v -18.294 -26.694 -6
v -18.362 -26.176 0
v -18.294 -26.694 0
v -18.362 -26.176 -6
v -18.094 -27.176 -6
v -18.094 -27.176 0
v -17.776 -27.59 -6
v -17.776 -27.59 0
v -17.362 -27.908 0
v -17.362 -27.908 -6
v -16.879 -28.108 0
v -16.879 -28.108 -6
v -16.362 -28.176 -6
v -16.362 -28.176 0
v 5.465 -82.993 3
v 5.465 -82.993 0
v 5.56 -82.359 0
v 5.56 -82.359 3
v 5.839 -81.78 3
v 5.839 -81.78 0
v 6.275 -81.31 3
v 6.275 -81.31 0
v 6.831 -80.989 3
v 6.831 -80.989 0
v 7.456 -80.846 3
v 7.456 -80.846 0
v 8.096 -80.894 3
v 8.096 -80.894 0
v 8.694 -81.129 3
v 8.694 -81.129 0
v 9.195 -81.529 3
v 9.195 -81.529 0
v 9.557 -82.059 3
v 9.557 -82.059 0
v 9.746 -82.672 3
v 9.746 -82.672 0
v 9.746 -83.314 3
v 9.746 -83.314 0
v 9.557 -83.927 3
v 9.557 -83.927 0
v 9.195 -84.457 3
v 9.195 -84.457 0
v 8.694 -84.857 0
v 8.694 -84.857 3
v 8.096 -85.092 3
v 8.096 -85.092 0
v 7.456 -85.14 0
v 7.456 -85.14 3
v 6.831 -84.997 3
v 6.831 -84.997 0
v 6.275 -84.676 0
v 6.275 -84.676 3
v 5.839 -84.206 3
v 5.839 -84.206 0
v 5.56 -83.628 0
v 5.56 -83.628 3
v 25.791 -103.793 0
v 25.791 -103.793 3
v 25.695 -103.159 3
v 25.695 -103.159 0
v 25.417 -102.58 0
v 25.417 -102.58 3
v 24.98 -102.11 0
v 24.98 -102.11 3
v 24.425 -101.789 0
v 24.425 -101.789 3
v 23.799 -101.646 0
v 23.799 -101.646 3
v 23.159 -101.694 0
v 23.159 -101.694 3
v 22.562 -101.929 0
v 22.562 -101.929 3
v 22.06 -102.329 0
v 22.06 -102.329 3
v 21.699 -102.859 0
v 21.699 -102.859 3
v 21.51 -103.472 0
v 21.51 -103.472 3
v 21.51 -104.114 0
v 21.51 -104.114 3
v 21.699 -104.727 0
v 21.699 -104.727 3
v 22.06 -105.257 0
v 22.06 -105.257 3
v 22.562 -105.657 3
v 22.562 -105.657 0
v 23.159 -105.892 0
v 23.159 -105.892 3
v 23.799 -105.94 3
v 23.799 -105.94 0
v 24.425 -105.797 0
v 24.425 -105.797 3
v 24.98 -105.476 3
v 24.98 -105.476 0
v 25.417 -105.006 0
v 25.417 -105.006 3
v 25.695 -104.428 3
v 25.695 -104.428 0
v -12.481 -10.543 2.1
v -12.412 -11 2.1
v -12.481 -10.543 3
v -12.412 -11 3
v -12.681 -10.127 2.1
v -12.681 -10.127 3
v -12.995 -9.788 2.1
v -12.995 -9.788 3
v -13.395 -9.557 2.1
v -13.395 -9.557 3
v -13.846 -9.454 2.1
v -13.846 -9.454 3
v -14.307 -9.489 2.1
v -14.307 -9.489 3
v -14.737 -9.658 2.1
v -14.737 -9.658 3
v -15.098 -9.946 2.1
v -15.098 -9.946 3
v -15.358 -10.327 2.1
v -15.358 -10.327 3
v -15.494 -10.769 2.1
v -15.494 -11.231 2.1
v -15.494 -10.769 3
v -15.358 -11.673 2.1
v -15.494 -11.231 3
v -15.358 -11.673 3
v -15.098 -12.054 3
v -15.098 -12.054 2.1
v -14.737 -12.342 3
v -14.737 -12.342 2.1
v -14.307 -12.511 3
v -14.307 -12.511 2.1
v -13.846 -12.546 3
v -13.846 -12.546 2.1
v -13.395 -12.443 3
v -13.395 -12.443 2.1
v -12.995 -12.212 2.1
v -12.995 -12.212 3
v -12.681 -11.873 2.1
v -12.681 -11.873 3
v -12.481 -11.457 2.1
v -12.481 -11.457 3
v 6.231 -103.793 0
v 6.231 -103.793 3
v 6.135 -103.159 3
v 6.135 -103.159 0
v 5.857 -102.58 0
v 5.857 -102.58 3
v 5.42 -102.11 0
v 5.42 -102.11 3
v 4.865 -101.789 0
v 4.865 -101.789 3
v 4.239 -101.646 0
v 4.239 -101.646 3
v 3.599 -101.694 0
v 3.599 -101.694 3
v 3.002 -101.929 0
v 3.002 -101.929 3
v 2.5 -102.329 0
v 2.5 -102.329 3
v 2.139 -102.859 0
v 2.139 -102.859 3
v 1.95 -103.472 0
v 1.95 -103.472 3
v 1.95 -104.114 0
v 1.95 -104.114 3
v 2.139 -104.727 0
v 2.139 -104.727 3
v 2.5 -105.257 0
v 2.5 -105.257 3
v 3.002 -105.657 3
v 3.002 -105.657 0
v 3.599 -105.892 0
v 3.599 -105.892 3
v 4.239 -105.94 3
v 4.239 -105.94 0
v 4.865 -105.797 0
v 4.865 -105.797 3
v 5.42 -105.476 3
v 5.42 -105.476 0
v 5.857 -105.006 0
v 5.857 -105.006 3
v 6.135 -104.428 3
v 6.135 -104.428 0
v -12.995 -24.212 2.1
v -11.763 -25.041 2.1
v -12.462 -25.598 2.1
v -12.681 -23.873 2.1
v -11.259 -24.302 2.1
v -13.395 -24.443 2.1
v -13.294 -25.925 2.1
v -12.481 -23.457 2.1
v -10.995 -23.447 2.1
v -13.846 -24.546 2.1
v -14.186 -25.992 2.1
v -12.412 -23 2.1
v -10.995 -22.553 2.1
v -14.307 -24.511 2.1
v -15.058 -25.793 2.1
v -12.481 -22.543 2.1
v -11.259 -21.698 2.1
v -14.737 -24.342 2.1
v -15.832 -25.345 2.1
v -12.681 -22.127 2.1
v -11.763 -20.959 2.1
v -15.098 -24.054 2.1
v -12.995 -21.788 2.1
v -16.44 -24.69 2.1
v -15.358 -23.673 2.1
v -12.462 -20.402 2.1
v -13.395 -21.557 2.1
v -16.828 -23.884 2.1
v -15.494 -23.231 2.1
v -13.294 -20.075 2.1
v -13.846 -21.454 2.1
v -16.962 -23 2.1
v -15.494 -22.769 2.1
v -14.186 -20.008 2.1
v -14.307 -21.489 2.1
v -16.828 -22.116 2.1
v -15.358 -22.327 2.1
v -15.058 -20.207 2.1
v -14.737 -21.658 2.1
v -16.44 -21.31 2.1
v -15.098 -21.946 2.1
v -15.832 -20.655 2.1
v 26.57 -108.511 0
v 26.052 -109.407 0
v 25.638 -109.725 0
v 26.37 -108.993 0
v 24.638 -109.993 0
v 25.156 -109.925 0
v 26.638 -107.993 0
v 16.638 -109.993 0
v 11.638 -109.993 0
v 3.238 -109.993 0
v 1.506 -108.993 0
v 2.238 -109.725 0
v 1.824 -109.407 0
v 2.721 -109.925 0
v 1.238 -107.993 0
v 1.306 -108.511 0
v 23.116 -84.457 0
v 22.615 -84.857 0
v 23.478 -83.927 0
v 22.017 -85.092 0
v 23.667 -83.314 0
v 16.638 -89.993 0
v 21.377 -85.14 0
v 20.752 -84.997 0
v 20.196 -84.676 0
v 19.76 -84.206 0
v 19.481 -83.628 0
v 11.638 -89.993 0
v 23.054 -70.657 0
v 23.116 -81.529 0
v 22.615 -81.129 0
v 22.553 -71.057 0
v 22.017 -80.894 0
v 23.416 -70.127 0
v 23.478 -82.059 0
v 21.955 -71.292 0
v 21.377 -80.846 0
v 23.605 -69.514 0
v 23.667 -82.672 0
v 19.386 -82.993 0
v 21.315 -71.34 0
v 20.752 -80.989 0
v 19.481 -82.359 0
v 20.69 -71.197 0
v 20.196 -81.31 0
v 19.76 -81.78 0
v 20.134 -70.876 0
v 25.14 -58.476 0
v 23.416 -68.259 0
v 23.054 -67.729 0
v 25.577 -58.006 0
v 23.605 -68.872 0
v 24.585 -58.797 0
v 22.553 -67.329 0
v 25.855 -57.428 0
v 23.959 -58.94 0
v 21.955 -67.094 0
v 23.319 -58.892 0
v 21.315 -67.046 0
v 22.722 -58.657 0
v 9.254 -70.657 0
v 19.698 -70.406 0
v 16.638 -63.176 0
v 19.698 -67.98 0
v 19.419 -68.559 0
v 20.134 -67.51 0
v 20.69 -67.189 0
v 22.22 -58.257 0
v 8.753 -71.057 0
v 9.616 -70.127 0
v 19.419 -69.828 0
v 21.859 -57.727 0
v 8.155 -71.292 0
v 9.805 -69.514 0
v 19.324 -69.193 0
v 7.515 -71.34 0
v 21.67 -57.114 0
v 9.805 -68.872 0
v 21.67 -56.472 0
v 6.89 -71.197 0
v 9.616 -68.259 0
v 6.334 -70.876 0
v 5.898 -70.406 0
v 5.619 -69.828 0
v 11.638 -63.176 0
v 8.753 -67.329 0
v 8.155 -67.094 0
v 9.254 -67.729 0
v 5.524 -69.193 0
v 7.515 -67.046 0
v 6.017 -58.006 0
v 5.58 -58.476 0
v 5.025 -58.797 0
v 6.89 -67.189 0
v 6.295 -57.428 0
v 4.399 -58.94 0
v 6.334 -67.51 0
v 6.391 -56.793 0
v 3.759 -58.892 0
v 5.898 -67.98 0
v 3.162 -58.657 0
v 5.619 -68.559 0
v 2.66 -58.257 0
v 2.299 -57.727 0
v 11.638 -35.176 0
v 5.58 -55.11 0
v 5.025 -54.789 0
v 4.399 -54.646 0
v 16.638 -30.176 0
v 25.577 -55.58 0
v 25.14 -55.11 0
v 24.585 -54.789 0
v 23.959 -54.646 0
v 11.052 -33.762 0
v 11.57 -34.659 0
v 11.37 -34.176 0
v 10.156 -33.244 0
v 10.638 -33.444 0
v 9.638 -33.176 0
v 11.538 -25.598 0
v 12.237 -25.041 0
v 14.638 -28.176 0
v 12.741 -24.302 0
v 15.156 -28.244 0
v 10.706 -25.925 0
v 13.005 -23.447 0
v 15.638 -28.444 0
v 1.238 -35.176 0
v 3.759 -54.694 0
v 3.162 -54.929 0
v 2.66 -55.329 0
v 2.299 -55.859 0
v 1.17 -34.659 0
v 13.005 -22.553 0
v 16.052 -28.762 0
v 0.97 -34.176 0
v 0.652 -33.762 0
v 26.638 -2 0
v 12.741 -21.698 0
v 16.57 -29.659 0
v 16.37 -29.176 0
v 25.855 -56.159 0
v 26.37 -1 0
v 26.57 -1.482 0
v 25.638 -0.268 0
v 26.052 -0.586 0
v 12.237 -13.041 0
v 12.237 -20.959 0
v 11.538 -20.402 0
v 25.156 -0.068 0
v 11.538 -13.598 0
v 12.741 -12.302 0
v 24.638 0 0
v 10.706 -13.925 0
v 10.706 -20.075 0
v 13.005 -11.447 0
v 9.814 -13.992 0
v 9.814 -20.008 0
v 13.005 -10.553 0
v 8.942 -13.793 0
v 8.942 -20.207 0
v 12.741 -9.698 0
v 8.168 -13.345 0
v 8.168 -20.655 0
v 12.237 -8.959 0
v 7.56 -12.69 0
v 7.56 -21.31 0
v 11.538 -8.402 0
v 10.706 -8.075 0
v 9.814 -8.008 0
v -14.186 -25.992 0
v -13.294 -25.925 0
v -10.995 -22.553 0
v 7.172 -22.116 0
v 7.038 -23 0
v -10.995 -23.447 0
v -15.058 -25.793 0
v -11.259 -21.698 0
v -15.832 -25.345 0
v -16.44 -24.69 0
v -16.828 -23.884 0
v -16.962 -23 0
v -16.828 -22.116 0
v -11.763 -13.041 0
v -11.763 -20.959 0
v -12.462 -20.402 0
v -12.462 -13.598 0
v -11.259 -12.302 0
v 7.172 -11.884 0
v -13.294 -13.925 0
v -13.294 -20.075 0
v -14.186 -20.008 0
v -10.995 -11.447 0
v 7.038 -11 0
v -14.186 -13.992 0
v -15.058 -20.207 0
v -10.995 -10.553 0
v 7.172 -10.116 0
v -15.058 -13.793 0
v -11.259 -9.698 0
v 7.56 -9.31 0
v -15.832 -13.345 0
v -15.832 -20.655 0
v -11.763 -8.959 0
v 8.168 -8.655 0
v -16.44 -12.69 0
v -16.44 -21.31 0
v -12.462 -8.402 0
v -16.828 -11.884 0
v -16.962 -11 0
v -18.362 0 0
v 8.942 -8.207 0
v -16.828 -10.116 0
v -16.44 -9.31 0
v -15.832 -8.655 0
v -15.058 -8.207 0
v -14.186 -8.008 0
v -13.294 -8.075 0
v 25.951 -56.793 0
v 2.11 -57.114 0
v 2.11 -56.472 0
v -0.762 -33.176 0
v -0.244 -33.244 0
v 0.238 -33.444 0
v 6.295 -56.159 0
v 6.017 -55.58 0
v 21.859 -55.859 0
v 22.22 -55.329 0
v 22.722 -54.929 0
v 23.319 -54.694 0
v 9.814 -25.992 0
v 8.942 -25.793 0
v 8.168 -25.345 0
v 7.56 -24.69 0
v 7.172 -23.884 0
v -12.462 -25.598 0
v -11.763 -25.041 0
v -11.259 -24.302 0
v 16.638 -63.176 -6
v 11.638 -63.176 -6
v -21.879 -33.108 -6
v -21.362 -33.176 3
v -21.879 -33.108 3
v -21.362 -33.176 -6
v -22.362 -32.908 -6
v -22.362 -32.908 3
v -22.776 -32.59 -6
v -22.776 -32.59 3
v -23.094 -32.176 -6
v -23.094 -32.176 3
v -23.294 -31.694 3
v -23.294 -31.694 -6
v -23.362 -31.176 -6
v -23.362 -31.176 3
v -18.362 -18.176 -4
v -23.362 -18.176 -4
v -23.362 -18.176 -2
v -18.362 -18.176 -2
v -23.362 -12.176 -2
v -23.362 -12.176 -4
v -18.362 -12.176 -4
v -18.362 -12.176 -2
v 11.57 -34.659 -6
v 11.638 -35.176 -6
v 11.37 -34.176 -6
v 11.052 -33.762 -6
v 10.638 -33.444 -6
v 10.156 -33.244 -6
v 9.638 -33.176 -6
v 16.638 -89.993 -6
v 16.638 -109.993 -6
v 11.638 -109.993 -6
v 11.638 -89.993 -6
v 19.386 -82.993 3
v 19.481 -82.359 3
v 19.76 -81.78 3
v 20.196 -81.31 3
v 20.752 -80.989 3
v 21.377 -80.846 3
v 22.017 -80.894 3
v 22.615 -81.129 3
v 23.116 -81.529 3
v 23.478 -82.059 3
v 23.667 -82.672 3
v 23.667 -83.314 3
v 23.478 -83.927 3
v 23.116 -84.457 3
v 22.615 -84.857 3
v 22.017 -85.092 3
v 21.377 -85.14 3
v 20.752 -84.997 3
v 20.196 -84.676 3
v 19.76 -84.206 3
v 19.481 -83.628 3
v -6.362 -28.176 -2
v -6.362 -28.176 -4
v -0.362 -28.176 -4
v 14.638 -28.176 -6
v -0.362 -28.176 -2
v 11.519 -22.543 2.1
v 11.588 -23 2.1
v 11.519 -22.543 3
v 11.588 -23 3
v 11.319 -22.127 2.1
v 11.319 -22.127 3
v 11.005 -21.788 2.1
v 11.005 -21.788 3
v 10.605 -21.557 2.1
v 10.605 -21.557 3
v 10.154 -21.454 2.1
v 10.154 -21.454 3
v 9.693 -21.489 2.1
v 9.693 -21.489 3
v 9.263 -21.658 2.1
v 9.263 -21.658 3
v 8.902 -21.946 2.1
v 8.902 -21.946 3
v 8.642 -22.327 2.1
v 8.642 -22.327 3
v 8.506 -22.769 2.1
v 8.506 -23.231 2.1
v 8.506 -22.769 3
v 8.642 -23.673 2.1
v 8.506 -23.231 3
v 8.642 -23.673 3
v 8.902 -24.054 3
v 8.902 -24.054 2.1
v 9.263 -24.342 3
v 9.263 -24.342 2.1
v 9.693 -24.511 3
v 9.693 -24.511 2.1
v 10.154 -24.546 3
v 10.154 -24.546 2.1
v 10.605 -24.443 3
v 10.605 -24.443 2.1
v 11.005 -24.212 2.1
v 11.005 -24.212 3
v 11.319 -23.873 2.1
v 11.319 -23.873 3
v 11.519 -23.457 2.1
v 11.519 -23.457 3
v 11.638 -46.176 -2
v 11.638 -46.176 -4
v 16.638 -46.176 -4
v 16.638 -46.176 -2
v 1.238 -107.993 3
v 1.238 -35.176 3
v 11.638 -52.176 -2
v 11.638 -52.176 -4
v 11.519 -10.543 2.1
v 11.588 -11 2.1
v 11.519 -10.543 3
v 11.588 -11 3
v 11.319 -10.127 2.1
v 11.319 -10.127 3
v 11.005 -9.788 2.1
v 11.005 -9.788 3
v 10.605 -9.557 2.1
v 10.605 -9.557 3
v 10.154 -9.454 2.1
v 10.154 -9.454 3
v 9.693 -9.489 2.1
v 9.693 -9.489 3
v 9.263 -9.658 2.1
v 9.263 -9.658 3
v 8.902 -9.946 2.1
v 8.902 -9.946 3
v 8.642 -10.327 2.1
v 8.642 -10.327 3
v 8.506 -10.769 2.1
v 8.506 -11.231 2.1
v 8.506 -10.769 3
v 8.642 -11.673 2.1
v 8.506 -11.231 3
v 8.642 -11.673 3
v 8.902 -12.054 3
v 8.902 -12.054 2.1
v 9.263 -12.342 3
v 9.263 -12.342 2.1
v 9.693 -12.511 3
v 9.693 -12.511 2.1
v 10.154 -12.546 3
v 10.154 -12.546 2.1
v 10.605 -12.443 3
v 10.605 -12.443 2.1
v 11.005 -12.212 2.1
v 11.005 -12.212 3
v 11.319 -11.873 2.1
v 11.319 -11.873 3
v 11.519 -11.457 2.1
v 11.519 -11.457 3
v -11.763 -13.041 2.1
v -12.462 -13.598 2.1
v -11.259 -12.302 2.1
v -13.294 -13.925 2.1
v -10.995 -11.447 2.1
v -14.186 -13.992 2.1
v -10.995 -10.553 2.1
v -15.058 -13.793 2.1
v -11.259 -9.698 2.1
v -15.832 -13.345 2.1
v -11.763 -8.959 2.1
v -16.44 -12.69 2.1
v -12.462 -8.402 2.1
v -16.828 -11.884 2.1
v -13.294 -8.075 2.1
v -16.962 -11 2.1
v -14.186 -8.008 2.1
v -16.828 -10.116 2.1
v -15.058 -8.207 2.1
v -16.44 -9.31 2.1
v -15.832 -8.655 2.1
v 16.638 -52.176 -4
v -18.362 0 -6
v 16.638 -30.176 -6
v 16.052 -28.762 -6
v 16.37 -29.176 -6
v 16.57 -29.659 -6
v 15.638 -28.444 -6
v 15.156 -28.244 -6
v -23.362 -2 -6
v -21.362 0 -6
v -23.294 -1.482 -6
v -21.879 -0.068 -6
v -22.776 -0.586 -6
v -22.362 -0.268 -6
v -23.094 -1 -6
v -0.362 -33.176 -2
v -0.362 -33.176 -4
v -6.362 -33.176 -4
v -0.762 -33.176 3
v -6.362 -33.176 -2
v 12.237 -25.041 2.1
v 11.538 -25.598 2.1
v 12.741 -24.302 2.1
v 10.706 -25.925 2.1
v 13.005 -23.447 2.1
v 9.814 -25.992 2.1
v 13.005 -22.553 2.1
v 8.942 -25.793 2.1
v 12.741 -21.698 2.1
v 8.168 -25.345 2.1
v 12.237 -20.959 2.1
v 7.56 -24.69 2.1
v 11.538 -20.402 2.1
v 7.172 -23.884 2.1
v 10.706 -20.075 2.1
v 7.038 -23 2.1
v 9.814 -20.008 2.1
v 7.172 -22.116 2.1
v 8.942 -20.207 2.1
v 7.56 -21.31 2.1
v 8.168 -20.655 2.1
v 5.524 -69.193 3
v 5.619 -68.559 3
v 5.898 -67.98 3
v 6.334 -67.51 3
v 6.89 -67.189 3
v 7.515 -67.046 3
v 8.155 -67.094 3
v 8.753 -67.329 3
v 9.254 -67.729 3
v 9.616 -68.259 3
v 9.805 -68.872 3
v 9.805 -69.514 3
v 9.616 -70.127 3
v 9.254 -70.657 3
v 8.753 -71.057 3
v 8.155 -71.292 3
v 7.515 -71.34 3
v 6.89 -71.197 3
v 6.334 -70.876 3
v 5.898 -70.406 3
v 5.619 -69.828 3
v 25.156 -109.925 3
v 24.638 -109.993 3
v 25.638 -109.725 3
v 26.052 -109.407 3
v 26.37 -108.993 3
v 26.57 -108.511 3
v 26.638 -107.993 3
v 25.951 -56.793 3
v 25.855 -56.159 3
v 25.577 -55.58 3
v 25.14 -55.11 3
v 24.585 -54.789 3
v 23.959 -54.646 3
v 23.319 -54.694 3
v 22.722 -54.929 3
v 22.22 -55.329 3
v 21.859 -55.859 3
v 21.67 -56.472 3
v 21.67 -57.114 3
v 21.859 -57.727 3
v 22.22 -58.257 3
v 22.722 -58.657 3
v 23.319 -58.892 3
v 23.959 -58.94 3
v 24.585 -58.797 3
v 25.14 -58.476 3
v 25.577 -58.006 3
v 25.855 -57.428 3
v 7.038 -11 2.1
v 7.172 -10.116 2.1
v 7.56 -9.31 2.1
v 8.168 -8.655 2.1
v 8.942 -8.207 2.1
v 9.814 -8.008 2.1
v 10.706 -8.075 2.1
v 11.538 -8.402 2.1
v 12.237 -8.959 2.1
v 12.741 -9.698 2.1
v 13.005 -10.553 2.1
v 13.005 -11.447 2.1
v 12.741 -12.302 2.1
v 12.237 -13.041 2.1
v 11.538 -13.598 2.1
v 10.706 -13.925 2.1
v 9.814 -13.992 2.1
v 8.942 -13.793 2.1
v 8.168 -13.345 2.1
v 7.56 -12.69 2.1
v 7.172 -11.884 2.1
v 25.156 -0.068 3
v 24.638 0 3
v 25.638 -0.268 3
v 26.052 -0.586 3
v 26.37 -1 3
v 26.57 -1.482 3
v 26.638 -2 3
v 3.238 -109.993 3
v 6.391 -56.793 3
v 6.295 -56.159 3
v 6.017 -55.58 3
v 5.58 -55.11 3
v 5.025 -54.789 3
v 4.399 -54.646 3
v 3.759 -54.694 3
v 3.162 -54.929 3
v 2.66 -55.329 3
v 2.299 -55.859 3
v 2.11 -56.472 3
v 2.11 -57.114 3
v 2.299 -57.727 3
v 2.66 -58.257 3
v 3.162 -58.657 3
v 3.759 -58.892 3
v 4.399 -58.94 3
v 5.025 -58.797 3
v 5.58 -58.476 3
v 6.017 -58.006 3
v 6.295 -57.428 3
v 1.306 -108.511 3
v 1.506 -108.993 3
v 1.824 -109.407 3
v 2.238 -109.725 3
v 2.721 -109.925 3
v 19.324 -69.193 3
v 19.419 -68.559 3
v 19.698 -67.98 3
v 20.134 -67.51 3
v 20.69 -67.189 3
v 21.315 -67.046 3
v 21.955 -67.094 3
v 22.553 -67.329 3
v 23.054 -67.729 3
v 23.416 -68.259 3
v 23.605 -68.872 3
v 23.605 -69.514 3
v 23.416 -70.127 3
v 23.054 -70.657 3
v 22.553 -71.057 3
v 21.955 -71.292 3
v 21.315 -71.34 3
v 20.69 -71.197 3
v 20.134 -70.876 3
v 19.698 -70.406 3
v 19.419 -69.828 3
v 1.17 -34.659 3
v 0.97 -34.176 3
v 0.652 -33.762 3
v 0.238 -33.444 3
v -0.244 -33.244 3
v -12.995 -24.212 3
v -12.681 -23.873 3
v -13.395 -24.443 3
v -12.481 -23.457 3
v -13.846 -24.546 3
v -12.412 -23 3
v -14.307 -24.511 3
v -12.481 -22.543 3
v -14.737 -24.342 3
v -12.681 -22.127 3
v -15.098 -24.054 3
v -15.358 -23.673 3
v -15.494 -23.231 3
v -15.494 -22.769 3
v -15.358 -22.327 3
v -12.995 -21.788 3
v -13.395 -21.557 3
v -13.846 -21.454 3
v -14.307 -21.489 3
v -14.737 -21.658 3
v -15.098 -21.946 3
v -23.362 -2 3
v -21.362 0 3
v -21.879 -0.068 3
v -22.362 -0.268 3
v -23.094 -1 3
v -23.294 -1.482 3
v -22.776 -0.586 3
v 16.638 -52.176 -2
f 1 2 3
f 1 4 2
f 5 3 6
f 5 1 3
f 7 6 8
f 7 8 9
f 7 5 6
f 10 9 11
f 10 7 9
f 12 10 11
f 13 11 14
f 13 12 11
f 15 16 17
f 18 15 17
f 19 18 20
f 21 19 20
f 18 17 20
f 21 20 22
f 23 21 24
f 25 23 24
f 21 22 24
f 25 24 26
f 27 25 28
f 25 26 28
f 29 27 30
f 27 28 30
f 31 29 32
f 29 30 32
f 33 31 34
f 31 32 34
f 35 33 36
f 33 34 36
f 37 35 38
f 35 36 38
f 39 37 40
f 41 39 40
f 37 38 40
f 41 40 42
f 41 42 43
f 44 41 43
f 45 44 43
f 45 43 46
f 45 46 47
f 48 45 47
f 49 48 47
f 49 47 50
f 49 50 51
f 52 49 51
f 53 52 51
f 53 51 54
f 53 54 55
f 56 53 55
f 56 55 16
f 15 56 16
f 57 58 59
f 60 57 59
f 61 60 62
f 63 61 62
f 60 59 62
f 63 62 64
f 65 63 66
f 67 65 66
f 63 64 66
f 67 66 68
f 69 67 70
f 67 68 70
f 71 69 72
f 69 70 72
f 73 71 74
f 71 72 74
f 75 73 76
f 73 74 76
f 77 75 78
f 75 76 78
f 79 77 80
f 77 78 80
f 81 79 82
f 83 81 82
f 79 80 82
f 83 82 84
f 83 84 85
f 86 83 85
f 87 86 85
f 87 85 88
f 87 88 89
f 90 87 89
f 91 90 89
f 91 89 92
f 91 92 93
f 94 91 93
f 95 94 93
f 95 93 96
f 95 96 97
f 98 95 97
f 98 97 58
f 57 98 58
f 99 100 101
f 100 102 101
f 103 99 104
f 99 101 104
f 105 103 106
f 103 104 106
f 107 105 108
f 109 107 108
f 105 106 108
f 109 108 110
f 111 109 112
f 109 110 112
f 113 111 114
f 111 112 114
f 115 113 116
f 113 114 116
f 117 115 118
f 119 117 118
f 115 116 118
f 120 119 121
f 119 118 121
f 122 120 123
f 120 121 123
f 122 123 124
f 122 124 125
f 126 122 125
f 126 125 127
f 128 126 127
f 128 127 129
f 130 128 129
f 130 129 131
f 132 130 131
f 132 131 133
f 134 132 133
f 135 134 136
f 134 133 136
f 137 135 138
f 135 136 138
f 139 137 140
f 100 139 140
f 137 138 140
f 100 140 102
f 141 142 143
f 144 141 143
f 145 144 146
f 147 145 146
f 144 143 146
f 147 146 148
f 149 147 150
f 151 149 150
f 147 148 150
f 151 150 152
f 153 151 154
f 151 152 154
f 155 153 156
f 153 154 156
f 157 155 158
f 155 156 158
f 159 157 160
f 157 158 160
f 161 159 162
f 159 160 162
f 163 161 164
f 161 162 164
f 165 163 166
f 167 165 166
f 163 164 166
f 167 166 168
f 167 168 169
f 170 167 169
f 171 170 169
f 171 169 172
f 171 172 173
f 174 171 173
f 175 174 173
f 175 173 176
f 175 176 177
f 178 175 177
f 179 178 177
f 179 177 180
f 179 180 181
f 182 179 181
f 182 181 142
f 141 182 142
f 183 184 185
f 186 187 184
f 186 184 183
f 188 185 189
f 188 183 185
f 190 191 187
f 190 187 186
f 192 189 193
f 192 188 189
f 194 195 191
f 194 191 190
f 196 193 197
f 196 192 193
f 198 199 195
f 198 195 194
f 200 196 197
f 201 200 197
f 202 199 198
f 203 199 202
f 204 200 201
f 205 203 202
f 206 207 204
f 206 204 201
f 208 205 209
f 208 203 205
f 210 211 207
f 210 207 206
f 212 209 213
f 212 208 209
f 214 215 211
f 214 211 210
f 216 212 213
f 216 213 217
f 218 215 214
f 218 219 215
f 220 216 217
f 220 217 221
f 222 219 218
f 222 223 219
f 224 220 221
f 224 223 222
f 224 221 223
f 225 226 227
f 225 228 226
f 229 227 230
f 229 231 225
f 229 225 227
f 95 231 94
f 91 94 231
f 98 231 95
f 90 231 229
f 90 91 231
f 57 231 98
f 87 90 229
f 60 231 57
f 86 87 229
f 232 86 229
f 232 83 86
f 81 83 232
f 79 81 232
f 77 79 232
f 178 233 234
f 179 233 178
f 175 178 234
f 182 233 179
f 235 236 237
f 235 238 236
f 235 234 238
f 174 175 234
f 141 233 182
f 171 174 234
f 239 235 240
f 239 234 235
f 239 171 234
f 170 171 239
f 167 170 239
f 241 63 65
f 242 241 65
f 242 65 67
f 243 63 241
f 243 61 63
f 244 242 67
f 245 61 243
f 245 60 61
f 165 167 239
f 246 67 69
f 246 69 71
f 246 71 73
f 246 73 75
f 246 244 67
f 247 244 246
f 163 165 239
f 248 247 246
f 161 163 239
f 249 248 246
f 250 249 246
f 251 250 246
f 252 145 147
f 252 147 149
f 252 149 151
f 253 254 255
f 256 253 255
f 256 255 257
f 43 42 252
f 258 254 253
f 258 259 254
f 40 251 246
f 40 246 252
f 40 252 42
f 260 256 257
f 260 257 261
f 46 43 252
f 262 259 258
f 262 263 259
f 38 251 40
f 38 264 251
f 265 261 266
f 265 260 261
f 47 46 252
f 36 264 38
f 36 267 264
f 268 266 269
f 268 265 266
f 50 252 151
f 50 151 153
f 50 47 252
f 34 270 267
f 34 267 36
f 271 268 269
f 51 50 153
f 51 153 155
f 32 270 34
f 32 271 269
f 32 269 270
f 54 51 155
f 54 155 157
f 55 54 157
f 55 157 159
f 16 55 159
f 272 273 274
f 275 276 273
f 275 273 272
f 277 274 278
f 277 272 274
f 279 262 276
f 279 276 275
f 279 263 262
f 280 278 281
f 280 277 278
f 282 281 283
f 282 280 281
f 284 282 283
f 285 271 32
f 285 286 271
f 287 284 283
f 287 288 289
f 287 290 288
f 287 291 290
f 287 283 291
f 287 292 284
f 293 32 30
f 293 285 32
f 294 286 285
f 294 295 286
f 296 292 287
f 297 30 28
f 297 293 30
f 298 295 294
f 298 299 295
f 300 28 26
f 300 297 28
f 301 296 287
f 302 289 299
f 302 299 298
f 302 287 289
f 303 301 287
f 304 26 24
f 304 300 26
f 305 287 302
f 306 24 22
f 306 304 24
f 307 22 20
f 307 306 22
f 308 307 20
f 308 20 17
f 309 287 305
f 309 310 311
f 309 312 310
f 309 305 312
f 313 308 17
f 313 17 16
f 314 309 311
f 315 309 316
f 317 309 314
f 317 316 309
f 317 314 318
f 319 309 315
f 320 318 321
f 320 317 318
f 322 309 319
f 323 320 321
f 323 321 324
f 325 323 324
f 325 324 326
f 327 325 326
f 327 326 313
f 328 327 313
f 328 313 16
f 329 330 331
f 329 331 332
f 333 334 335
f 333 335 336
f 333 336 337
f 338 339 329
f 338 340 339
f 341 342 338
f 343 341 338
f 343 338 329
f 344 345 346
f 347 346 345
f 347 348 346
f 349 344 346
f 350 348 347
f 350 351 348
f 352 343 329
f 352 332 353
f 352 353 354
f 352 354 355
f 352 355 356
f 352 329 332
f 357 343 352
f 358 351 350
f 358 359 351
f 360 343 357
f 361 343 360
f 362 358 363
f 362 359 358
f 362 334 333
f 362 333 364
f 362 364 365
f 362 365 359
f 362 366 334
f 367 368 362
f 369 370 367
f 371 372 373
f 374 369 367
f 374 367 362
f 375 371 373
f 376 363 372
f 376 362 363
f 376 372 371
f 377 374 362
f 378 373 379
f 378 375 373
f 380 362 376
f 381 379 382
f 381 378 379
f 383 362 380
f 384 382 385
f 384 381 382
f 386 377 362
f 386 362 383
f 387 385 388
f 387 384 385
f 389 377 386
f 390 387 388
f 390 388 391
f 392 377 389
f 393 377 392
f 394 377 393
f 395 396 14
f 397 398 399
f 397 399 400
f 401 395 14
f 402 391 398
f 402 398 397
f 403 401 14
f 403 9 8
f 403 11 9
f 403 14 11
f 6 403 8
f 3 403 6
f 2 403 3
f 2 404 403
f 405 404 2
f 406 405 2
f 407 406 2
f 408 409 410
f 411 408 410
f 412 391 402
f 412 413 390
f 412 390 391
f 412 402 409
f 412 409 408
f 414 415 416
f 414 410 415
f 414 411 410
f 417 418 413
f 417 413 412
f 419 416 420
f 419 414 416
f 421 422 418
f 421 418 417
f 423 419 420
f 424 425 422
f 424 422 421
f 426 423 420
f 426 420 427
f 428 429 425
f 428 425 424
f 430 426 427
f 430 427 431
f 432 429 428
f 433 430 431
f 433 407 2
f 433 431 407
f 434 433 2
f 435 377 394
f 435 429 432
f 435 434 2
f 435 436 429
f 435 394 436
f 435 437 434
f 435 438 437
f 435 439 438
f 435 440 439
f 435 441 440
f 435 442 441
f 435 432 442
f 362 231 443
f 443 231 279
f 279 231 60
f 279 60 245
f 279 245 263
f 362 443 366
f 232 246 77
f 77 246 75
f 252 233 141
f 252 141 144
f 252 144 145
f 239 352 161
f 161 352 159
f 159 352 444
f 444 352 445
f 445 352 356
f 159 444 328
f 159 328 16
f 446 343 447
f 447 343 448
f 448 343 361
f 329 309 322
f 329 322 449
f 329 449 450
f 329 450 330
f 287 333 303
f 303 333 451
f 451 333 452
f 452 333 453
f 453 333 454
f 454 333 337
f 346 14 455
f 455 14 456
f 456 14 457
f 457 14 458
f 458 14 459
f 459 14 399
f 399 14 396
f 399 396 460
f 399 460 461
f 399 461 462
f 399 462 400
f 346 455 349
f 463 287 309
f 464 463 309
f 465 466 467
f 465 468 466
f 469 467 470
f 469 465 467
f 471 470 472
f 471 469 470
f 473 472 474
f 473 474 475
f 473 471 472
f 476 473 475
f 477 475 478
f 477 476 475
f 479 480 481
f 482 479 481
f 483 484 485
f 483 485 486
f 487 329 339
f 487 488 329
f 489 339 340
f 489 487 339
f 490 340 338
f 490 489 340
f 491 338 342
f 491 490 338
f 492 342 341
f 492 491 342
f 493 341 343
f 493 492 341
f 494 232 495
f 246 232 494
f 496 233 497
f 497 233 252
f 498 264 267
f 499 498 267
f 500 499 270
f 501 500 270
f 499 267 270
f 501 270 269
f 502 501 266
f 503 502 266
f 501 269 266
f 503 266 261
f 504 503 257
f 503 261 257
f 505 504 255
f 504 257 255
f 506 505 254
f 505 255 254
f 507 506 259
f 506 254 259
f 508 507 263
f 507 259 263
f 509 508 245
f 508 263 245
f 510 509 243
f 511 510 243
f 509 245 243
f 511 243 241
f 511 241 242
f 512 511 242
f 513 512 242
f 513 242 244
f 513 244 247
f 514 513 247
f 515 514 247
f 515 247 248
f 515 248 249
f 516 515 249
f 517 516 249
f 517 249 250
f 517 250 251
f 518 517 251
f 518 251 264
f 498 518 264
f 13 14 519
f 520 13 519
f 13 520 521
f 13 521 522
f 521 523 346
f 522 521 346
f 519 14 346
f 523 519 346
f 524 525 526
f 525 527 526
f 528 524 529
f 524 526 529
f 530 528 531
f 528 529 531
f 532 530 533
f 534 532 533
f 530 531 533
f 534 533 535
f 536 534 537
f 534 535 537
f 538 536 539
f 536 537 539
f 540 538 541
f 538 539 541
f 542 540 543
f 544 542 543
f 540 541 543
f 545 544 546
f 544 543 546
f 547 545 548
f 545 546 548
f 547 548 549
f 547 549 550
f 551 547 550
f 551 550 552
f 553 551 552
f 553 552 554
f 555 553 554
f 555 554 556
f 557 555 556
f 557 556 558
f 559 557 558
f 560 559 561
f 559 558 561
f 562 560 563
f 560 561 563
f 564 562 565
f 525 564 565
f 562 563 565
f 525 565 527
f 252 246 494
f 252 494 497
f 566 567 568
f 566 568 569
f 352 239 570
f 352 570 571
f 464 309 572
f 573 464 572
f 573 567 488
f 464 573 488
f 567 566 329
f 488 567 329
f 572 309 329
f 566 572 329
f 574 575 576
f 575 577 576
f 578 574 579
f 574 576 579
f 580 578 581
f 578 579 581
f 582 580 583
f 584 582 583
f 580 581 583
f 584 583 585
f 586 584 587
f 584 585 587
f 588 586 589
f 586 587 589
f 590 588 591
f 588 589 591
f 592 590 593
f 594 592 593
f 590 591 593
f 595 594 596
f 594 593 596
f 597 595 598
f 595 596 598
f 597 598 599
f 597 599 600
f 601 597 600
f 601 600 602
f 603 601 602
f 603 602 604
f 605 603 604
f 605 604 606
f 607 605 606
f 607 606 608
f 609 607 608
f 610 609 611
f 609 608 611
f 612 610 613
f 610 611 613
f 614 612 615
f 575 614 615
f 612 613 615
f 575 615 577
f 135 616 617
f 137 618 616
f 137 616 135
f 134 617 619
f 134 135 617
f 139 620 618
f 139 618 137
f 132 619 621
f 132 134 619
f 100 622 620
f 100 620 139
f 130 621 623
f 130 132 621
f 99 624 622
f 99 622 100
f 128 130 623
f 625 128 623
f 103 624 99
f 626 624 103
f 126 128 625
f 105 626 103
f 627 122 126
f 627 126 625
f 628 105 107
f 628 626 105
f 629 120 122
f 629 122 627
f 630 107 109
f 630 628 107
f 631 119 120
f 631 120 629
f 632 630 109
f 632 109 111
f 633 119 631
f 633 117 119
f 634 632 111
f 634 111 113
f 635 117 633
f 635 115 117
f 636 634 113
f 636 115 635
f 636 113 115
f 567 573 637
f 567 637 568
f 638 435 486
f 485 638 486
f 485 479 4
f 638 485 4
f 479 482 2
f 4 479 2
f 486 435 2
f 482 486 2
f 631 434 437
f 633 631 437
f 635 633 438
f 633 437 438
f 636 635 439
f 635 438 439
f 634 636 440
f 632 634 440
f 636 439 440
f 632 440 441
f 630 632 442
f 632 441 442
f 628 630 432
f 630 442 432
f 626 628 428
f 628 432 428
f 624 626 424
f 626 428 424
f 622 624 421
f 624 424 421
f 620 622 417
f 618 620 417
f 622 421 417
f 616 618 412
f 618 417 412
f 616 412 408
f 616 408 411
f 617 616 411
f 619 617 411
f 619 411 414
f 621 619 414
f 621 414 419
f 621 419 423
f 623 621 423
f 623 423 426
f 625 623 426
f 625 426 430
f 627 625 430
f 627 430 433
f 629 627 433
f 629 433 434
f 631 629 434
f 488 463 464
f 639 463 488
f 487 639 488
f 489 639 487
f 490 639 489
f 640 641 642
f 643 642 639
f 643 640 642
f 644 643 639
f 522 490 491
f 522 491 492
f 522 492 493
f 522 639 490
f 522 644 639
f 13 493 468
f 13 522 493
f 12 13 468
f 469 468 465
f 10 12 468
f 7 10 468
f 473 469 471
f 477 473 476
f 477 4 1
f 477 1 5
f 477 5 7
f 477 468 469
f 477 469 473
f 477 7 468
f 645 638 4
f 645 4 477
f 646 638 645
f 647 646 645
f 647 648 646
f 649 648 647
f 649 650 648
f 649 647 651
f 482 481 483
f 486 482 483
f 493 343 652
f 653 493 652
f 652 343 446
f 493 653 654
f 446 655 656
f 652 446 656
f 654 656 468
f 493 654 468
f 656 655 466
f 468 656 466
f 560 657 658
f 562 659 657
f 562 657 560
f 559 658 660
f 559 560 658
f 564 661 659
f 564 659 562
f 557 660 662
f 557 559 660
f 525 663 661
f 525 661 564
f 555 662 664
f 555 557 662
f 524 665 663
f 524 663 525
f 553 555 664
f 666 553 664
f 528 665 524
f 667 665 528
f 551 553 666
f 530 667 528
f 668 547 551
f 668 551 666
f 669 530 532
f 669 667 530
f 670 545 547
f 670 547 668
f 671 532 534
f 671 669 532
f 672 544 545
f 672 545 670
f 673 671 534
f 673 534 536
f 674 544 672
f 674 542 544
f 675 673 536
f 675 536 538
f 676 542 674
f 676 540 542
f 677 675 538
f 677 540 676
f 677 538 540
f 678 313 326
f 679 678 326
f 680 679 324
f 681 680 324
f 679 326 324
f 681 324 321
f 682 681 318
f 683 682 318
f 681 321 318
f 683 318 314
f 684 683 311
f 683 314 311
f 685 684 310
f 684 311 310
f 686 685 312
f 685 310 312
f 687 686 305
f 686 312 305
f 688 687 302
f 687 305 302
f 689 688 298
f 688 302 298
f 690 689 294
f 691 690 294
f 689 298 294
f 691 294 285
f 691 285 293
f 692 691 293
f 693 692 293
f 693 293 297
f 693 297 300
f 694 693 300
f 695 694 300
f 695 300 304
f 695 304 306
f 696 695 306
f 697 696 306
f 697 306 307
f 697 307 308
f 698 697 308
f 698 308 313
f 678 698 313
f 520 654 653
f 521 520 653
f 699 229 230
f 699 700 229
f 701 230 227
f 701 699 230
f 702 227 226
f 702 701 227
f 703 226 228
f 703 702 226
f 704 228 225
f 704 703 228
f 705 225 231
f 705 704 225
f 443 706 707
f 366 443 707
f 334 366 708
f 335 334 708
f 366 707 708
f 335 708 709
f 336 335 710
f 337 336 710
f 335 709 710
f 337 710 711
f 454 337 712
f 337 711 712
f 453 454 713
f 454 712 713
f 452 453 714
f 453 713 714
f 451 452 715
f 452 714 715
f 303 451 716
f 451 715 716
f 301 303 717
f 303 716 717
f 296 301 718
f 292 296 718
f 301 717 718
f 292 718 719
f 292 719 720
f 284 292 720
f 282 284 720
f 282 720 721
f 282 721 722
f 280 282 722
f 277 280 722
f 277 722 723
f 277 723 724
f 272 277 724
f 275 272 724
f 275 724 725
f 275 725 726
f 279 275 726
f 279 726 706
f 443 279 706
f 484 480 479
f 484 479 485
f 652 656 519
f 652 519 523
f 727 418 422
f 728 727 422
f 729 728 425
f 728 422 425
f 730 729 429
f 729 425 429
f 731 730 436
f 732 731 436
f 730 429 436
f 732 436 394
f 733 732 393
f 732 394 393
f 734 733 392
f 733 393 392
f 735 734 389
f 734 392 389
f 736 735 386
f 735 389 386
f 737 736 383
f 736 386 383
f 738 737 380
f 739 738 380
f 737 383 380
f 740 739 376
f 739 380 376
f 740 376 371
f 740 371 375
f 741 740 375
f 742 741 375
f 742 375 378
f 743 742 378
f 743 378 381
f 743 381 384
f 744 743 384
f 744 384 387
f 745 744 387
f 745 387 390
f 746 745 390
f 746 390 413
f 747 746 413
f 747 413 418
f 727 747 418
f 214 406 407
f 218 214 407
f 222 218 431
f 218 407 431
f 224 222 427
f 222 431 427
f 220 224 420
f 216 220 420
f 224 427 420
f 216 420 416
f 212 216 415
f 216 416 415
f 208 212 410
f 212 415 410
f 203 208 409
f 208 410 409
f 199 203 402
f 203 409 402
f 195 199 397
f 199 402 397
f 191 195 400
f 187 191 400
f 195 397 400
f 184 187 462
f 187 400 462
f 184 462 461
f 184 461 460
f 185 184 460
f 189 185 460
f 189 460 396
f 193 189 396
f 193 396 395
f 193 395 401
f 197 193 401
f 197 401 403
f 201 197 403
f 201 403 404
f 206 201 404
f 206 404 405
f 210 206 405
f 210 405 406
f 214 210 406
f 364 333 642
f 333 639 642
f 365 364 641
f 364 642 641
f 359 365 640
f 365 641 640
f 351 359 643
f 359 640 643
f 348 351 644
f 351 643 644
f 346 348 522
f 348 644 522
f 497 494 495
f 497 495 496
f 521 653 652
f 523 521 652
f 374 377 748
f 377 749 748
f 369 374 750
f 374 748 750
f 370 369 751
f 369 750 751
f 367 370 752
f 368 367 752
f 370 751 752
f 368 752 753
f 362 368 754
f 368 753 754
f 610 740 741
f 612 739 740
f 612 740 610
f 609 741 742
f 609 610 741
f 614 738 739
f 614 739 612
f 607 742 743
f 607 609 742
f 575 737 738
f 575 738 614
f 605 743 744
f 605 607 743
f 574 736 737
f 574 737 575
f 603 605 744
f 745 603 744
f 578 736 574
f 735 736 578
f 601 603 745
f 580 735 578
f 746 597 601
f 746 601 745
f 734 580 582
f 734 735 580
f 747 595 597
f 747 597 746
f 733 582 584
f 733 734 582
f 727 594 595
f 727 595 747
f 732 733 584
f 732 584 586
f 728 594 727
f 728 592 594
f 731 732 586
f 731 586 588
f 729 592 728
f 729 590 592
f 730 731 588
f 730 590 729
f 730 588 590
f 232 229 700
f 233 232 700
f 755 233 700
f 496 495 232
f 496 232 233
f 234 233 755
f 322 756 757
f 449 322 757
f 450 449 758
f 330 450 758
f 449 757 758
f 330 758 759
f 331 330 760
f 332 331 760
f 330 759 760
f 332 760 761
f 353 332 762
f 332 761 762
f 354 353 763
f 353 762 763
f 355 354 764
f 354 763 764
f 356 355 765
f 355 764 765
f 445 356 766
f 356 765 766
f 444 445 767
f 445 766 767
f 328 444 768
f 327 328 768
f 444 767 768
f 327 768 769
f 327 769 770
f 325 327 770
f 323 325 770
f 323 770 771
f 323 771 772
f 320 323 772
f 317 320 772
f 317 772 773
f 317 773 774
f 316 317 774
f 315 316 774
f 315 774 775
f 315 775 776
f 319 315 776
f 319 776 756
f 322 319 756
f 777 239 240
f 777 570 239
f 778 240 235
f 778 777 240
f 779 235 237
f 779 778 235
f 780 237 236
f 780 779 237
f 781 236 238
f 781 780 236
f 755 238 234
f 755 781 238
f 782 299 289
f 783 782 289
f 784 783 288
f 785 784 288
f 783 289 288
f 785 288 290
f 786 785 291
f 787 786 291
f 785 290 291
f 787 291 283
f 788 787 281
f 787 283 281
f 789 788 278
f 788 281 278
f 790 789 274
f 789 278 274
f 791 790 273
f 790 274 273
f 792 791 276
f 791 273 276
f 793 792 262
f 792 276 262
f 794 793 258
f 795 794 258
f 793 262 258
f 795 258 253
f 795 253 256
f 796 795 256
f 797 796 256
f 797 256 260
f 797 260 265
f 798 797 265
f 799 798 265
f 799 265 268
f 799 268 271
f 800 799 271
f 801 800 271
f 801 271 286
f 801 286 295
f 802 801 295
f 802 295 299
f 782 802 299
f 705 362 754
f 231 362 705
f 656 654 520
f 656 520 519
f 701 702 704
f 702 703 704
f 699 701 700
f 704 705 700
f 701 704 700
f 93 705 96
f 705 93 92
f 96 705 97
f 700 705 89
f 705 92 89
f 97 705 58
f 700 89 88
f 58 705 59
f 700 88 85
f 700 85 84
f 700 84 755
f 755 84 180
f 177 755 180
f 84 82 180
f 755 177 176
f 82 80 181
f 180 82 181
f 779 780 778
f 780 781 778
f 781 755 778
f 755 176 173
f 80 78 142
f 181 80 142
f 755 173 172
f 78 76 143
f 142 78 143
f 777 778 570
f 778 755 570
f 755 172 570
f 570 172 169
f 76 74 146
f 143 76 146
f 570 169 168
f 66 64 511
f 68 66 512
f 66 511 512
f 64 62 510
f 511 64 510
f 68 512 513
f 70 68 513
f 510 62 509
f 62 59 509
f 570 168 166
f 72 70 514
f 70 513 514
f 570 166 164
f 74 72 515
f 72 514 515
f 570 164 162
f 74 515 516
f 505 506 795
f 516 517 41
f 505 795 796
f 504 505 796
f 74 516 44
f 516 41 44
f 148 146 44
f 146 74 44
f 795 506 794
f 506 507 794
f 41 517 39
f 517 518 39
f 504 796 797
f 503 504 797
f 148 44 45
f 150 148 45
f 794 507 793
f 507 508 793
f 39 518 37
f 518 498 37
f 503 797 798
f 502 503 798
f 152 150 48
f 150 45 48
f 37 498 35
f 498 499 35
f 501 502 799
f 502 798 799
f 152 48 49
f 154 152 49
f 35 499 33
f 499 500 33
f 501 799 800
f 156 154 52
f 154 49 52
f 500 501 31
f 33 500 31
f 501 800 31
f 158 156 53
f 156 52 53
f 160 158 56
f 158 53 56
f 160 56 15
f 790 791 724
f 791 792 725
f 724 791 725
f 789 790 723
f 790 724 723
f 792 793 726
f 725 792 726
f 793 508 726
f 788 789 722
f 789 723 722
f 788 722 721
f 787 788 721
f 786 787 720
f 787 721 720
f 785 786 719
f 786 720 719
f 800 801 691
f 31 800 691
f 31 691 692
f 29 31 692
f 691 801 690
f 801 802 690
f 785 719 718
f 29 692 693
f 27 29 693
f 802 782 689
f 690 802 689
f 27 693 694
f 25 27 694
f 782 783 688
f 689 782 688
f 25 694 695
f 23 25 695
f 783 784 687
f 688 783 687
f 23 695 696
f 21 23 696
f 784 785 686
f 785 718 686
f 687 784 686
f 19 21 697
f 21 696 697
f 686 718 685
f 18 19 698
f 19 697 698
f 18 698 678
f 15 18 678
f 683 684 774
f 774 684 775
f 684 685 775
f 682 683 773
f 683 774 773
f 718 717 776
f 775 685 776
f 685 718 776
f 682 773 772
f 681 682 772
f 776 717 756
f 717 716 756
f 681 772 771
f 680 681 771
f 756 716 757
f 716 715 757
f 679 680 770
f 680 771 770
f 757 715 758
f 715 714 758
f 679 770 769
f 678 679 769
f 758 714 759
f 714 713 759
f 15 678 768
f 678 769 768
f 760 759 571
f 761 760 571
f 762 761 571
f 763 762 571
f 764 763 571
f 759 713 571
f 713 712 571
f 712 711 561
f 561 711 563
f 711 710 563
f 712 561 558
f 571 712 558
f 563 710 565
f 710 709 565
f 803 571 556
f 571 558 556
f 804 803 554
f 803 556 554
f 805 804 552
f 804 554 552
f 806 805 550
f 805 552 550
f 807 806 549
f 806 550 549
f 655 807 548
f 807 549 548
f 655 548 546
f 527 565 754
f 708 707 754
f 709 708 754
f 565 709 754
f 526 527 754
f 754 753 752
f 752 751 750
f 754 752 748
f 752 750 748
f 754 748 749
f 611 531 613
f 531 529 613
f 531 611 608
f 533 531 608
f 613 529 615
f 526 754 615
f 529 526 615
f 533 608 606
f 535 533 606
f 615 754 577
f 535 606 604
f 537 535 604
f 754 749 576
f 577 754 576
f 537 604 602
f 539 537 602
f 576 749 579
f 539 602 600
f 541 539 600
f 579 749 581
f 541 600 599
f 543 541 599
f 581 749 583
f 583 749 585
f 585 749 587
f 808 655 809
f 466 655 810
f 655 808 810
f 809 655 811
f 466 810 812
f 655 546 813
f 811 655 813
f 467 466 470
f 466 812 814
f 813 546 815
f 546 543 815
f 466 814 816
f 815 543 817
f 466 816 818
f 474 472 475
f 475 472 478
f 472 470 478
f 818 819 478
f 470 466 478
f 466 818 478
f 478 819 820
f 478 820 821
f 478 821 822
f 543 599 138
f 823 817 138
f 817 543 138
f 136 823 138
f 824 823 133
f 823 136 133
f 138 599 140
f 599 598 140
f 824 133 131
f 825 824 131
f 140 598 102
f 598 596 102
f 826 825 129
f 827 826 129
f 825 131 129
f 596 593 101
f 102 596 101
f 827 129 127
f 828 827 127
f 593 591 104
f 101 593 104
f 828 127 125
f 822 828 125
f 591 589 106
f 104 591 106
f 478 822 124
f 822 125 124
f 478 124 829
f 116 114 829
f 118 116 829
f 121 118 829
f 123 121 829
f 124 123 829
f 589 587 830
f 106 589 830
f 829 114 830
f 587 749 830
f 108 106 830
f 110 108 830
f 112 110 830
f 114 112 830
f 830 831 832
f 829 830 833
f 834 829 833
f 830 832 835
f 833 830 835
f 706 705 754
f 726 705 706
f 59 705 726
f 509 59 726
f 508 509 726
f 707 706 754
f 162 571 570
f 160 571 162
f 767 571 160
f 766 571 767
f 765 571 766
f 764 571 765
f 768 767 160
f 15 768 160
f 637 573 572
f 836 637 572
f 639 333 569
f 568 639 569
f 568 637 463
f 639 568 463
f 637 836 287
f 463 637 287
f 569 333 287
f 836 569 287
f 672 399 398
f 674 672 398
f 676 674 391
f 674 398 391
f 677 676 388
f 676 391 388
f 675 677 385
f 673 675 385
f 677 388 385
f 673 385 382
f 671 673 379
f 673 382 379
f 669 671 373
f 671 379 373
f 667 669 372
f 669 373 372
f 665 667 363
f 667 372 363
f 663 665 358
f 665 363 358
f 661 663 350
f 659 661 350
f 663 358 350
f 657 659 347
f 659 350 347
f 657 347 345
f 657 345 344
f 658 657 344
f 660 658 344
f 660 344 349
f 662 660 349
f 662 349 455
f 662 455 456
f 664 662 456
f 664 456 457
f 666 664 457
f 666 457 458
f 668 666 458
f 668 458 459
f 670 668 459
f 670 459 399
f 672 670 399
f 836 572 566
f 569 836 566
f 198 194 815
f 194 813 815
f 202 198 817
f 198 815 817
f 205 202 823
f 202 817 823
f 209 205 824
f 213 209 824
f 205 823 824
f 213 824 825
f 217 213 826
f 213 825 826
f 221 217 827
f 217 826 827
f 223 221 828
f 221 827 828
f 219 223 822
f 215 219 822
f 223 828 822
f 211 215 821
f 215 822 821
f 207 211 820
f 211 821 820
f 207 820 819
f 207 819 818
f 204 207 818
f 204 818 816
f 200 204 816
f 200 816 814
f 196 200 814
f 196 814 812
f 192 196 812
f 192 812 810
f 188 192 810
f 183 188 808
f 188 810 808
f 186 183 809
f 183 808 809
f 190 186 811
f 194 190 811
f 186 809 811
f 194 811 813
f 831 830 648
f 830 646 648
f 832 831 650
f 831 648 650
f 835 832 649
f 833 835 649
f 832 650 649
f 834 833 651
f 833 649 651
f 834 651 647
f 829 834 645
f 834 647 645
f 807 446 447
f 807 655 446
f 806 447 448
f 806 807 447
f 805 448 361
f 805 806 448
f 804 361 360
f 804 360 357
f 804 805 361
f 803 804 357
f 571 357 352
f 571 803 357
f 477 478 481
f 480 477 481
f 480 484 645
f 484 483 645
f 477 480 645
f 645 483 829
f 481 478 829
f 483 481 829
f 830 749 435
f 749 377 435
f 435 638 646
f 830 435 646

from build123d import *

# Parameters (mm, degrees)
BOSS_EXTRU_1_DEPTH                                 = 3
D_GAGEMENT_61_D                                    = 4.3053
CHAMBRAGE_POUR_VIS_T_TE_RONDE_BOMB_E_M_D           = 3.1
CHAMBRAGE_POUR_VIS_T_TE_RONDE_BOMB_E_M_CBORE_D     = 6
CHAMBRAGE_POUR_VIS_T_TE_RONDE_BOMB_E_M_CBORE_DEPTH = 2.1
ESQUISSE7_W                                        = 5
ESQUISSE7_H                                        = 20
BOSS_EXTRU_2_DEPTH                                 = 6
ENL_V_MAT_EXTRU_1_REACH                            = 117.583
ESQUISSE8_W                                        = 2
ESQUISSE8_H                                        = 6
ENL_V_MAT_EXTRU_2_REACH                            = 83.526
ESQUISSE9_W                                        = 6
ESQUISSE9_H                                        = 2
ENL_V_MAT_EXTRU_3_REACH                            = 122.973
ESQUISSE10_W                                       = 2
ESQUISSE10_H                                       = 6
CONG_1_R                                           = 2
D_GAGEMENT_65_D                                    = 4.3053
D_GAGEMENT_64_D                                    = 4.3053


with BuildPart() as part:
    # Esquisse1 → Boss.-Extru.1 (new body)
    with BuildSketch(Plane.XY):
        Polygon((0, 0), (26.638249305, 0), (26.638249305, -109.993030409), (1.238249305, -109.993030409), (1.238249305, -33.176189805), (-23.361750695, -33.176189805), (-23.361750695, 0), align=None)
    extrude(amount=BOSS_EXTRU_1_DEPTH)

    # Dégagement #61 (through all)
    with Locations(Plane.XY.offset(3)):
        with Locations((21.47630139, -69.193030409), (7.67630139, -69.193030409), (7.617175732, -82.993030409), (21.538249305, -82.993030409)):
            Hole(D_GAGEMENT_61_D / 2)

    # Chambrage pour vis à tête ronde bombée M2.51 (through all)
    with Locations(Plane(origin=(0, 0, 0), x_dir=(-1, 0, 0), z_dir=(0, 0, -1))):
        with Locations((13.961750695, -23), (13.961750695, -11), (-10.038249305, -11), (-10.038249305, -23)):
            CounterBoreHole(CHAMBRAGE_POUR_VIS_T_TE_RONDE_BOMB_E_M_D / 2, CHAMBRAGE_POUR_VIS_T_TE_RONDE_BOMB_E_M_CBORE_D / 2, CHAMBRAGE_POUR_VIS_T_TE_RONDE_BOMB_E_M_CBORE_DEPTH)

    # Esquisse7 → Boss.-Extru.2 (add)
    with BuildSketch(Plane(origin=(0, 0, 0), x_dir=(-1, 0, 0), z_dir=(0, 0, -1))):
        Polygon((-11.638249305, -63.176189805), (-11.638249305, -33.176189805), (23.361750695, -33.176189805), (23.361750695, 0), (18.361750695, 0), (18.361750695, -28.176189805), (-16.638249305, -28.176189805), (-16.638249305, -63.176189805), align=None)
        with Locations((-14.138249305, -99.993030409)):
            Rectangle(ESQUISSE7_W, ESQUISSE7_H)
    extrude(amount=BOSS_EXTRU_2_DEPTH)

    # Esquisse8 → Enlèv. mat.-Extru.1 (cut, up to next)
    with BuildSketch(Plane.ZY.offset(-11.638249305), mode=Mode.PRIVATE) as enl_v_mat_extru_1_sk1:
        with Locations((-3, -49.176189805)):
            Rectangle(ESQUISSE8_W, ESQUISSE8_H)
    enl_v_mat_extru_1_tool1 = extrude(enl_v_mat_extru_1_sk1.sketch, amount=-ENL_V_MAT_EXTRU_1_REACH, mode=Mode.PRIVATE) & part.part
    add(enl_v_mat_extru_1_tool1.solids().sort_by_distance((11.638249, -49.17619, -3))[0], mode=Mode.SUBTRACT)

    # Esquisse9 → Enlèv. mat.-Extru.2 (cut, up to next)
    with BuildSketch(Plane.XZ.offset(33.176189805), mode=Mode.PRIVATE) as enl_v_mat_extru_2_sk1:
        with Locations((-3.361750695, -3)):
            Rectangle(ESQUISSE9_W, ESQUISSE9_H)
    enl_v_mat_extru_2_tool1 = extrude(enl_v_mat_extru_2_sk1.sketch, amount=-ENL_V_MAT_EXTRU_2_REACH, mode=Mode.PRIVATE) & part.part
    add(enl_v_mat_extru_2_tool1.solids().sort_by_distance((-3.361751, -33.17619, -3))[0], mode=Mode.SUBTRACT)

    # Esquisse10 → Enlèv. mat.-Extru.3 (cut, up to next)
    with BuildSketch(Plane.ZY.offset(23.361750695), mode=Mode.PRIVATE) as enl_v_mat_extru_3_sk1:
        with Locations((-3, -15.176189805)):
            Rectangle(ESQUISSE10_W, ESQUISSE10_H)
    enl_v_mat_extru_3_tool1 = extrude(enl_v_mat_extru_3_sk1.sketch, amount=-ENL_V_MAT_EXTRU_3_REACH, mode=Mode.PRIVATE) & part.part
    add(enl_v_mat_extru_3_tool1.solids().sort_by_distance((-23.361751, -15.17619, -3))[0], mode=Mode.SUBTRACT)

    # Congé1
    cong_1_edges = [part.edges().sort_by_distance(p)[0] for p in [
        (26.638249305, 0, 1.5),
        (26.638249305, -109.993030409, 1.5),
        (1.238249305, -109.993030409, 1.5),
        (1.238249305, -33.176189805, 1.5),
        (-23.361750695, -33.176189805, -1.5),
        (-23.361750695, 0, -1.5),
        (-18.361750695, -28.176189805, -3),
        (16.638249305, -28.176189805, -3),
        (11.638249305, -33.176189805, -3),
    ]]
    fillet(cong_1_edges, radius=CONG_1_R)

    # Dégagement #65 (through all)
    with Locations(Plane(origin=(0, 0, 0), x_dir=(-1, 0, 0), z_dir=(0, 0, -1))):
        with Locations((-23.638249305, -103.793030409), (-4.078249305, -103.793030409)):
            Hole(D_GAGEMENT_65_D / 2)

    # Dégagement #64 (through all)
    with Locations(Plane(origin=(0, 0, 0), x_dir=(-1, 0, 0), z_dir=(0, 0, -1))):
        with Locations((-23.798249305, -56.793030409), (-4.238249305, -56.793030409)):
            Hole(D_GAGEMENT_64_D / 2)


solid = part.part
